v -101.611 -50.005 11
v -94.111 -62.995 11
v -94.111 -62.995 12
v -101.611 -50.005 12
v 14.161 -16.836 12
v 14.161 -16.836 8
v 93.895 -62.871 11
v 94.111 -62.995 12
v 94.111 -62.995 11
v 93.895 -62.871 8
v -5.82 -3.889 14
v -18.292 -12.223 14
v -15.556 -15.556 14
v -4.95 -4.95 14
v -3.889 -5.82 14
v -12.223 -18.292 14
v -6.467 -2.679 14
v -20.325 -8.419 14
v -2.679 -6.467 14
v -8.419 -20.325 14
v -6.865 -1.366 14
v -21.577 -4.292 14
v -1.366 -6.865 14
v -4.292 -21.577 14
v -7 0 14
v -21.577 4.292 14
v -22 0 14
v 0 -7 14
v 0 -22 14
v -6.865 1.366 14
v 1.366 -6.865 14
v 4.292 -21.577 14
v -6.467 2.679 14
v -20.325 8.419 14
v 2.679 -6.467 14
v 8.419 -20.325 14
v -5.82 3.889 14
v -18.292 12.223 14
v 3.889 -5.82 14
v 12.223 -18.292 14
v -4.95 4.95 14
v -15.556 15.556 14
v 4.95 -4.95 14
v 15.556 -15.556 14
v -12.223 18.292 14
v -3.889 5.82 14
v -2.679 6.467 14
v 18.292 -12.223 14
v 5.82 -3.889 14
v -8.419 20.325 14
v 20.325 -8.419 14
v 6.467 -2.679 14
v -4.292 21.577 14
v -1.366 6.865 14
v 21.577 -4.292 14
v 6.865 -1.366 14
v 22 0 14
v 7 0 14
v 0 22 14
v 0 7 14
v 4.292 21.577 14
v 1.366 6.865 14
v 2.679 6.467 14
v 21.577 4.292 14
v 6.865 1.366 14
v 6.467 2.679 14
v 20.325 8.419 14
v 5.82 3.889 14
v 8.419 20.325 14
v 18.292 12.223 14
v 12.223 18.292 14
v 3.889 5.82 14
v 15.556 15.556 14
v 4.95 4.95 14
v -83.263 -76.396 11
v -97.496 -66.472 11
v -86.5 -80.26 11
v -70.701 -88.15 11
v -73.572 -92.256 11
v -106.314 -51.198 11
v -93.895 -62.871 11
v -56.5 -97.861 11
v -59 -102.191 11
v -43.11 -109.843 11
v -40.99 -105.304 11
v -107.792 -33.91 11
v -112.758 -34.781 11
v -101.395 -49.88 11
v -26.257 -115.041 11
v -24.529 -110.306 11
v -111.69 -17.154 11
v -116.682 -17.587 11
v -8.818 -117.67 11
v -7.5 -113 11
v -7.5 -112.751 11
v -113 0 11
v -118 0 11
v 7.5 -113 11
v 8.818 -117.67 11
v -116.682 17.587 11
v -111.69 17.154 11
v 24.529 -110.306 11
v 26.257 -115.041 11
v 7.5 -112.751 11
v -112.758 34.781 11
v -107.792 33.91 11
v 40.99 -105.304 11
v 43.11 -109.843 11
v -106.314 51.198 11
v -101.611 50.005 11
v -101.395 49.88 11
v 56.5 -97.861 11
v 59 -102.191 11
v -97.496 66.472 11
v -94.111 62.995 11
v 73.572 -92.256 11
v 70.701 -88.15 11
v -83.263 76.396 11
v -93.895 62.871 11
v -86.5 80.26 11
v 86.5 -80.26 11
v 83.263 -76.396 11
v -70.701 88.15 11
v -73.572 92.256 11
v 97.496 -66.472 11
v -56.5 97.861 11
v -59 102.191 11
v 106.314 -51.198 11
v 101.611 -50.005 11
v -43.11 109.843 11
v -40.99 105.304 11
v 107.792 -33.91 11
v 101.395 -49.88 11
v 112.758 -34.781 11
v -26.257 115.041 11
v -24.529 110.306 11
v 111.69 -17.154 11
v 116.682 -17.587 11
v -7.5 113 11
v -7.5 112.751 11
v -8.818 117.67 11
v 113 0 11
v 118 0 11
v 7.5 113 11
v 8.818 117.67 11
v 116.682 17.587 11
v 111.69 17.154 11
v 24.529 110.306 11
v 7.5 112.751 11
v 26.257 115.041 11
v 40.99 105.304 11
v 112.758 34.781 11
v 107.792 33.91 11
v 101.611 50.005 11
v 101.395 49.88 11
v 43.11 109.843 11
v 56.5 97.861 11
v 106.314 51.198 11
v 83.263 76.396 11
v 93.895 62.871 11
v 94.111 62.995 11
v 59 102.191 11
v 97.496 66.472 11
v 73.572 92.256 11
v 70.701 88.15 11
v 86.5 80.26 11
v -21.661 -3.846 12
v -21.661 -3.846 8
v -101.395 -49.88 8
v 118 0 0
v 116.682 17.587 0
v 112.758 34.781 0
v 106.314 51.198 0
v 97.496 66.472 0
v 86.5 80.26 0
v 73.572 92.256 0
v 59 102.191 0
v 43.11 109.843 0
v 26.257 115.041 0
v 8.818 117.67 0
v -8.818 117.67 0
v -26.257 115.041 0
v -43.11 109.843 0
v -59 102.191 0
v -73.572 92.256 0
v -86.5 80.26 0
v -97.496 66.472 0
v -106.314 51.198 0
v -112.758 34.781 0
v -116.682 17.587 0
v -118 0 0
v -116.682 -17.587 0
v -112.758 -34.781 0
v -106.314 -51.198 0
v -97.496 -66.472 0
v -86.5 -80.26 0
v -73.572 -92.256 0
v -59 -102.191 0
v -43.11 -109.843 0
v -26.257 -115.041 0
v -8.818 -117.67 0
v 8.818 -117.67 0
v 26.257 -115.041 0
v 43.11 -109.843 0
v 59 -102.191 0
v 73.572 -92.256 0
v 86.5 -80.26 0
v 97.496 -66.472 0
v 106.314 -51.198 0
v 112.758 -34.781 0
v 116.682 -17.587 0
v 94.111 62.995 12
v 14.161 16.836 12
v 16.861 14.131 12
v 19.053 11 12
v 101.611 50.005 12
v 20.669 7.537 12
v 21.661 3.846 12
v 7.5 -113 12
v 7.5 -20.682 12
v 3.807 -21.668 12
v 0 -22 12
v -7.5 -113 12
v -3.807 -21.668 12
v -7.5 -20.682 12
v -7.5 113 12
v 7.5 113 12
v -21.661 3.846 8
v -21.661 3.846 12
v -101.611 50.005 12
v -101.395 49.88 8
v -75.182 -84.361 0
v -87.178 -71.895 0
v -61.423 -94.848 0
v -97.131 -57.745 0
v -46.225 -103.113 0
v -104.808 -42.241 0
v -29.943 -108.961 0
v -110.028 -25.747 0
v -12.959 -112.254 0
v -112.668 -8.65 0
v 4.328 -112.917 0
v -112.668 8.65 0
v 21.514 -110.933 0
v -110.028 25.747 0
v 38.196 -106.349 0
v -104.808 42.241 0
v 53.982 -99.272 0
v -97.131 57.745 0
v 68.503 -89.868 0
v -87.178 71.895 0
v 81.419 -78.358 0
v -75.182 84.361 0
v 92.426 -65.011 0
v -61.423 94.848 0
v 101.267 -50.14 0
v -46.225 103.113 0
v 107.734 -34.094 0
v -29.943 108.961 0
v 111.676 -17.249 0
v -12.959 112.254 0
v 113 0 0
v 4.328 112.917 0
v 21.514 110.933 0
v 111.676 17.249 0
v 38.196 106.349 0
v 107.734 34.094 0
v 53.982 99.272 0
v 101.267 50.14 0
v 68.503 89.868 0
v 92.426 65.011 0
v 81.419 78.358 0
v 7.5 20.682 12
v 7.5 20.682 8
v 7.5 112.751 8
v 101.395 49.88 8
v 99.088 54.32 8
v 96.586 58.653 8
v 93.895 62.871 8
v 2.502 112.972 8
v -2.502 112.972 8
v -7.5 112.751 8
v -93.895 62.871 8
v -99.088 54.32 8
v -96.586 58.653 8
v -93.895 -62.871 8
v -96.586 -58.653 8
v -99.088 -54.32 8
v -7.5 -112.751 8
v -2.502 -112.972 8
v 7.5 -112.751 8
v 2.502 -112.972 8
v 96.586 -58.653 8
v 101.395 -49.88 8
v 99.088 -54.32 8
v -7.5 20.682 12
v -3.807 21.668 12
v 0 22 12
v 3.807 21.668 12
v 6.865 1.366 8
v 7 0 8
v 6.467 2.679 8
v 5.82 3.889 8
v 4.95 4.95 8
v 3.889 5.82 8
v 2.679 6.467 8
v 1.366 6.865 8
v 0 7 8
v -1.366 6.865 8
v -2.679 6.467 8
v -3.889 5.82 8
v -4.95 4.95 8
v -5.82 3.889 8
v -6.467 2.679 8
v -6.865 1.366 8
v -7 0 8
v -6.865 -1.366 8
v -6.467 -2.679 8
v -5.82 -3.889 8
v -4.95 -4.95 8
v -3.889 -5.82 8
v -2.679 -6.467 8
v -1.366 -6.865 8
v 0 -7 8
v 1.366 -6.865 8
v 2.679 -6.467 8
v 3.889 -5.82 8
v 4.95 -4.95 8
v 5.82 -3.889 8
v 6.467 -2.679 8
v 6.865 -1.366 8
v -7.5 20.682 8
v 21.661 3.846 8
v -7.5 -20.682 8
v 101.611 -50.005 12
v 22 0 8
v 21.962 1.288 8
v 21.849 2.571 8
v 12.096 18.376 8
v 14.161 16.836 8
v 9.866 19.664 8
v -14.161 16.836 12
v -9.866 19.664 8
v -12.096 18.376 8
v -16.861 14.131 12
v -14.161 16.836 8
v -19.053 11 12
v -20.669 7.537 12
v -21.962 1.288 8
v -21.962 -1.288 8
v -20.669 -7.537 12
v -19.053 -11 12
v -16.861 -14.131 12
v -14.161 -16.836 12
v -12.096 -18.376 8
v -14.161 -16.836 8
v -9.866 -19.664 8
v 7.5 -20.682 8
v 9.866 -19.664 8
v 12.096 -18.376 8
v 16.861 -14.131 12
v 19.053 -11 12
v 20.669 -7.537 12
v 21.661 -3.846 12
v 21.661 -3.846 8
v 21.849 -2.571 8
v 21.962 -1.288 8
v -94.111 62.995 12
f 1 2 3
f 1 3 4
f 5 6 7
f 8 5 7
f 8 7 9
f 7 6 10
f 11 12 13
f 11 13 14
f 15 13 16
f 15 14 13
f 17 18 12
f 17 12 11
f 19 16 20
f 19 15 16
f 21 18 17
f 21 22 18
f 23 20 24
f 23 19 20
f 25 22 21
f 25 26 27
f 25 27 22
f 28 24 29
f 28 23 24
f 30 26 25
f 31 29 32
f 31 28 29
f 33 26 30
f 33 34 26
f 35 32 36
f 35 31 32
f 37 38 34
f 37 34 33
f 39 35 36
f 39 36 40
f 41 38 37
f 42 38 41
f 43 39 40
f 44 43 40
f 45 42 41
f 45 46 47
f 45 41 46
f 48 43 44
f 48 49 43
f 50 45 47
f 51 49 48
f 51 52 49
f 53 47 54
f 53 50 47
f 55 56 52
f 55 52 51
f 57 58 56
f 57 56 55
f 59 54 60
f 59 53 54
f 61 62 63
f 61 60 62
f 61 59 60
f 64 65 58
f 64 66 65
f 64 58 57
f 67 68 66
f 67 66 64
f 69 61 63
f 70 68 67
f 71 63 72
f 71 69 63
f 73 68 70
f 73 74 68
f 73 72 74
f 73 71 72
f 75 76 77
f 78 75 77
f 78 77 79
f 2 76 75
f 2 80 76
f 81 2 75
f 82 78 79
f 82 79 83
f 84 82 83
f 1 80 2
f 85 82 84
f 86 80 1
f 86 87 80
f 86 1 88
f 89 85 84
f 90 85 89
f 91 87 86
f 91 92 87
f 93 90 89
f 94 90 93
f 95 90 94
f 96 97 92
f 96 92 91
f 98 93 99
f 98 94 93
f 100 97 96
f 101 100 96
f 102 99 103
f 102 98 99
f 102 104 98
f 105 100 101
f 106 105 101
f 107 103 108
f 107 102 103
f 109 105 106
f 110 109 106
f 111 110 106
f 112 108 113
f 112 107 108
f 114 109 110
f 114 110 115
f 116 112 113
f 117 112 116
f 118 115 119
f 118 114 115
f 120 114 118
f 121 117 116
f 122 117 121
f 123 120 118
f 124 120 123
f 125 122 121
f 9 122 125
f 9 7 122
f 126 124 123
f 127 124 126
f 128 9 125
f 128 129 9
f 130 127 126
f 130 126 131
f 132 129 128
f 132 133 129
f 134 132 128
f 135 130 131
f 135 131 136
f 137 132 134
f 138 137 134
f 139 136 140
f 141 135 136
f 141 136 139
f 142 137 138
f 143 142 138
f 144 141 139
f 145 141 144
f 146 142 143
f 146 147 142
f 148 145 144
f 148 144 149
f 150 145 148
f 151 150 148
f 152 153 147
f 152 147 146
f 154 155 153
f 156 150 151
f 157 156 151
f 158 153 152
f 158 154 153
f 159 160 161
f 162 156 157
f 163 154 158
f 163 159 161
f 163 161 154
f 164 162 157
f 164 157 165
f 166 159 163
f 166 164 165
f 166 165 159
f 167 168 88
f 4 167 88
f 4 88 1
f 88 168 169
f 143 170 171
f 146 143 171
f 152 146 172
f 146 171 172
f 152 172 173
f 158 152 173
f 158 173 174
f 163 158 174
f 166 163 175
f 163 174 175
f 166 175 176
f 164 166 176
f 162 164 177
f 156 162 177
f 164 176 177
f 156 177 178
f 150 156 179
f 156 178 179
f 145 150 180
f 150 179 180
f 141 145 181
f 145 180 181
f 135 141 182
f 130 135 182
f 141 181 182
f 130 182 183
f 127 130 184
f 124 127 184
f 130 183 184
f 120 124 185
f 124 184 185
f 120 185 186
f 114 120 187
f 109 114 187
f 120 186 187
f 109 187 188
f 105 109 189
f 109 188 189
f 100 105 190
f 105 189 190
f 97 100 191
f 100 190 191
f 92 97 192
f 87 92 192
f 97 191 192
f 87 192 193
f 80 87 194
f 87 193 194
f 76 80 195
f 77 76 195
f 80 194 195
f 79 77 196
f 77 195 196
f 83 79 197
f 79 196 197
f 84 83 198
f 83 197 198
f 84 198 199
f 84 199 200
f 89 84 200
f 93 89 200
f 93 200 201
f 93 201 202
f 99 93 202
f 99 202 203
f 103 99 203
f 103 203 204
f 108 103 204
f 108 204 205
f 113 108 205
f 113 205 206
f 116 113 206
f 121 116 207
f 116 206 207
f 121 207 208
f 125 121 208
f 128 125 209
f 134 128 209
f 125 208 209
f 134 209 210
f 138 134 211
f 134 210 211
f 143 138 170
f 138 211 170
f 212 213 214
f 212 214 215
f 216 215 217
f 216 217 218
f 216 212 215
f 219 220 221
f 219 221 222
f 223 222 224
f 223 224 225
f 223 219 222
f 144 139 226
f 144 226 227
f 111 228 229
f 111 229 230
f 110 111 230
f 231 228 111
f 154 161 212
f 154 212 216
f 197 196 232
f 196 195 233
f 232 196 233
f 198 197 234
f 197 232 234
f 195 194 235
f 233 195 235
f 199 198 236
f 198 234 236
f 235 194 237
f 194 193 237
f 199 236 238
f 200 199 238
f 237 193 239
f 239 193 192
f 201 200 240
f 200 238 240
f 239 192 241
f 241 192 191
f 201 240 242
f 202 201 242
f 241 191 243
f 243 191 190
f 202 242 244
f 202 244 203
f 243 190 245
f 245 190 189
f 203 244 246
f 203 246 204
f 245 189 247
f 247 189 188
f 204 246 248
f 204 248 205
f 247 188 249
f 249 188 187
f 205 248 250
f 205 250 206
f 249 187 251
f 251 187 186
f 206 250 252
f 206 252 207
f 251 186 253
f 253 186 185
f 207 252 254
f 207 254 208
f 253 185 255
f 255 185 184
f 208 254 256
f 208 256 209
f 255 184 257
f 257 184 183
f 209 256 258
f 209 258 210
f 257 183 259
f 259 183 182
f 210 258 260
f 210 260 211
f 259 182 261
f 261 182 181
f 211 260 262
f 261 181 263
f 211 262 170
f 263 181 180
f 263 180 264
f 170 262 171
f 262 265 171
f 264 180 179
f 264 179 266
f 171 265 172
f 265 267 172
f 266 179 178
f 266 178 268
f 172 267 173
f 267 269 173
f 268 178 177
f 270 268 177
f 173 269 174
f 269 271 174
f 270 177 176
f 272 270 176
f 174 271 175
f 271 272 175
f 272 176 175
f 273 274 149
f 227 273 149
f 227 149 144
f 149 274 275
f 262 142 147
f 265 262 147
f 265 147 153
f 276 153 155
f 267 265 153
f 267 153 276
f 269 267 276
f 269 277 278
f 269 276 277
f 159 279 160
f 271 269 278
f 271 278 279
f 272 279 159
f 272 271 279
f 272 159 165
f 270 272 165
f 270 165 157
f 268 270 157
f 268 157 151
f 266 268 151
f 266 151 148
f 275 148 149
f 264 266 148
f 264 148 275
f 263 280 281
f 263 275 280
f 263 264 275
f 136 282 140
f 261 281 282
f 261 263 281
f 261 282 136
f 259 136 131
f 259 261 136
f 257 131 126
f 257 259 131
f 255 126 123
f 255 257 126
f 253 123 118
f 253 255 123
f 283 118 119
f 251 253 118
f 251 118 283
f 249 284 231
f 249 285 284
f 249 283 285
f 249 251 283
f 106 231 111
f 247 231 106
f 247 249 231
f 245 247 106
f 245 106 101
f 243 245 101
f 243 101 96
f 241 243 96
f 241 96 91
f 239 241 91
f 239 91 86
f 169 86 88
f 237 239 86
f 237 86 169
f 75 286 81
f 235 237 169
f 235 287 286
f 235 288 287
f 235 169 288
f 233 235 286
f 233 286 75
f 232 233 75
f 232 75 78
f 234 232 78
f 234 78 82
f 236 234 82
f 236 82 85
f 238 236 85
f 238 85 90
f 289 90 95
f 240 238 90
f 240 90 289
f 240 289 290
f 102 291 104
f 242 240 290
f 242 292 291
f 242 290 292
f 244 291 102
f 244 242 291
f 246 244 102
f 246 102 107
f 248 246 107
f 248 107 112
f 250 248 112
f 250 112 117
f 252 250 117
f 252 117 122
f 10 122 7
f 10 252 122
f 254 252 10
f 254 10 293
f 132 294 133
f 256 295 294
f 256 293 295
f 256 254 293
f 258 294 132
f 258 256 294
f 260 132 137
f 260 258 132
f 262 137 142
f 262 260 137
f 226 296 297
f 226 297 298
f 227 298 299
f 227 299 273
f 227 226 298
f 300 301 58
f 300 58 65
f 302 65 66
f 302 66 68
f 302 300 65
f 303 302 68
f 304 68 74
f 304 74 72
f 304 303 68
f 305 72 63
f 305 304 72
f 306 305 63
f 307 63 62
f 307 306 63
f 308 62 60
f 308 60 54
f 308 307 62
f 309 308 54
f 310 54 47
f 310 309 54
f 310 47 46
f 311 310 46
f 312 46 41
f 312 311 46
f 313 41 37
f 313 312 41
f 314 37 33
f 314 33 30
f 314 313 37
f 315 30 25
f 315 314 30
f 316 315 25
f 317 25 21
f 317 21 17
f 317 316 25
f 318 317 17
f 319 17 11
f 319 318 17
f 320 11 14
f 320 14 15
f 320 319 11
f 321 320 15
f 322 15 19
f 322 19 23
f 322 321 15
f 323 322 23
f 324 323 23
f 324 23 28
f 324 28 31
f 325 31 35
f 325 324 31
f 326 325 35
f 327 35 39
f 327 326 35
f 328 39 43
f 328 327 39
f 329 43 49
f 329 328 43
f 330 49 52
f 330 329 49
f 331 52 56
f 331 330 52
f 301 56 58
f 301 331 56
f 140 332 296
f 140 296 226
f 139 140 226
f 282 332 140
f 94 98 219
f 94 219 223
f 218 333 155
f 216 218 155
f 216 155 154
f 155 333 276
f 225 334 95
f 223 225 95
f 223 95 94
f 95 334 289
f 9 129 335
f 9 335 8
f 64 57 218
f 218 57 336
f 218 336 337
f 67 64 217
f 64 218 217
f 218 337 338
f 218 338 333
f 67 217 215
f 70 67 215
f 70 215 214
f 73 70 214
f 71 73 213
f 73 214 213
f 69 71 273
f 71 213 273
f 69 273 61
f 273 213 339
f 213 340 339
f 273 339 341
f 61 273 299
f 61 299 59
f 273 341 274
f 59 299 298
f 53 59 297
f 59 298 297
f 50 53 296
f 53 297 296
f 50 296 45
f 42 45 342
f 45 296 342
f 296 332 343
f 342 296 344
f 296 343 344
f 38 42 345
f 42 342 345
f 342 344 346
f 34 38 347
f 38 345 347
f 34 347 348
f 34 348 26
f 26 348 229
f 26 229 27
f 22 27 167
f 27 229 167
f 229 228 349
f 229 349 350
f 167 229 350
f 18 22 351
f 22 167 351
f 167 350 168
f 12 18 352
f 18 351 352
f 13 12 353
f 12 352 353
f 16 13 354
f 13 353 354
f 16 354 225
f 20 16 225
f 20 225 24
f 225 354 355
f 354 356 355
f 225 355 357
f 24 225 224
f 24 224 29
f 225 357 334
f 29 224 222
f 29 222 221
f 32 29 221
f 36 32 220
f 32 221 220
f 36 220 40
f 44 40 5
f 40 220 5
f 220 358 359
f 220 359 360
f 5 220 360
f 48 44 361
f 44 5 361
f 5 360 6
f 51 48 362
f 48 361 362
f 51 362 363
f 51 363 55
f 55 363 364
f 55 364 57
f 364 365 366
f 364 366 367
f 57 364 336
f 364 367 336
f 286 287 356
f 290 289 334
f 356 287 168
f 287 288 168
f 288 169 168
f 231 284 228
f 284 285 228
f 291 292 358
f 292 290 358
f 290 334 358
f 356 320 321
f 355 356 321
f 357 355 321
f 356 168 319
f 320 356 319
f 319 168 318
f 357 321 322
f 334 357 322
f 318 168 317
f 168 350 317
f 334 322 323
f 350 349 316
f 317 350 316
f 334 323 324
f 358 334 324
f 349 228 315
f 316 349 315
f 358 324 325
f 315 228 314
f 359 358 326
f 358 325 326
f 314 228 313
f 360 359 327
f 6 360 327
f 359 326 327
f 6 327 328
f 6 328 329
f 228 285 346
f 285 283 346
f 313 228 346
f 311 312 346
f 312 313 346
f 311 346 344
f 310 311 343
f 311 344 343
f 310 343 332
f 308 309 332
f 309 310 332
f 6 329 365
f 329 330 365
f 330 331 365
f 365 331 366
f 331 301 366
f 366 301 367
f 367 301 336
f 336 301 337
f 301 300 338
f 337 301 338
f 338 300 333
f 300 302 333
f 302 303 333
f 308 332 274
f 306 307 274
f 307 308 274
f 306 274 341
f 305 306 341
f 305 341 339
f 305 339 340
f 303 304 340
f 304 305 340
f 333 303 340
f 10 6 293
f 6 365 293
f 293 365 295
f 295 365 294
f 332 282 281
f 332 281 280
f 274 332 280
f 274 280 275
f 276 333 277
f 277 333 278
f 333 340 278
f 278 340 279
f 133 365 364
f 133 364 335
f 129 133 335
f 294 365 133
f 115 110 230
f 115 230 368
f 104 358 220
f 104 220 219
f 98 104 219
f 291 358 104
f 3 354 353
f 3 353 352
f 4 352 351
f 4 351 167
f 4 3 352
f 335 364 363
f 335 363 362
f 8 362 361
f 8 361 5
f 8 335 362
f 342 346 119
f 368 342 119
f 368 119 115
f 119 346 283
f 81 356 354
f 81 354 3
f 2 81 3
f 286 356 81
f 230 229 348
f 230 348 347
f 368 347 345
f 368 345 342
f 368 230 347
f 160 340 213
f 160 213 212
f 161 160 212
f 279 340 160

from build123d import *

# Parameters (mm, degrees)
SKETCH_1_R               = 118
SKETCH_1_R_2             = 113
EXTRUDE_1_DEPTH          = 11
EXTRUDE_START            = -3
SKETCH_2_W               = 15
SKETCH_2_H               = 98.117087724
EXTRUDE_2_DEPTH          = 4
PATTERN_CIRCULAR_1_COUNT = 6
EXTRUDE_3_DEPTH          = 3
EXTRUDE_3_DEPTH_BACK     = 3
SKETCH_3_R               = 22
SKETCH_3_R_2             = 7


with BuildPart() as part:
    # 草图1 → 拉伸-薄壁1 (new body)
    with BuildSketch(Plane.XY):
        Circle(SKETCH_1_R)
        Circle(SKETCH_1_R_2, mode=Mode.SUBTRACT)
    extrude(amount=EXTRUDE_1_DEPTH)

    # 草图2 → 拉伸-薄壁2 (add)
    with BuildSketch(Plane.XY.offset(11).offset(EXTRUDE_START)):
        with Locations((0, 63.941456138)):
            Rectangle(SKETCH_2_W, SKETCH_2_H)
    extrude_2 = extrude(amount=EXTRUDE_2_DEPTH)

    # 阵列(圆周)1: 拉伸-薄壁2 ×6 about axis
    pattern_circular_1_axis = Axis((0, 0, 0), (0, 0, 1))
    for i in range(1, PATTERN_CIRCULAR_1_COUNT):
        add(extrude_2.rotate(pattern_circular_1_axis, i * 360 / PATTERN_CIRCULAR_1_COUNT))

    # 草图3 → 拉伸-薄壁3 (add, two sides: drawn at the far end of the back side and taken through both)
    with BuildSketch(Plane.XY.offset(11).offset(-EXTRUDE_3_DEPTH_BACK)):
        Circle(SKETCH_3_R)
        Circle(SKETCH_3_R_2, mode=Mode.SUBTRACT)
    extrude(amount=EXTRUDE_3_DEPTH + EXTRUDE_3_DEPTH_BACK)


solid = part.part
